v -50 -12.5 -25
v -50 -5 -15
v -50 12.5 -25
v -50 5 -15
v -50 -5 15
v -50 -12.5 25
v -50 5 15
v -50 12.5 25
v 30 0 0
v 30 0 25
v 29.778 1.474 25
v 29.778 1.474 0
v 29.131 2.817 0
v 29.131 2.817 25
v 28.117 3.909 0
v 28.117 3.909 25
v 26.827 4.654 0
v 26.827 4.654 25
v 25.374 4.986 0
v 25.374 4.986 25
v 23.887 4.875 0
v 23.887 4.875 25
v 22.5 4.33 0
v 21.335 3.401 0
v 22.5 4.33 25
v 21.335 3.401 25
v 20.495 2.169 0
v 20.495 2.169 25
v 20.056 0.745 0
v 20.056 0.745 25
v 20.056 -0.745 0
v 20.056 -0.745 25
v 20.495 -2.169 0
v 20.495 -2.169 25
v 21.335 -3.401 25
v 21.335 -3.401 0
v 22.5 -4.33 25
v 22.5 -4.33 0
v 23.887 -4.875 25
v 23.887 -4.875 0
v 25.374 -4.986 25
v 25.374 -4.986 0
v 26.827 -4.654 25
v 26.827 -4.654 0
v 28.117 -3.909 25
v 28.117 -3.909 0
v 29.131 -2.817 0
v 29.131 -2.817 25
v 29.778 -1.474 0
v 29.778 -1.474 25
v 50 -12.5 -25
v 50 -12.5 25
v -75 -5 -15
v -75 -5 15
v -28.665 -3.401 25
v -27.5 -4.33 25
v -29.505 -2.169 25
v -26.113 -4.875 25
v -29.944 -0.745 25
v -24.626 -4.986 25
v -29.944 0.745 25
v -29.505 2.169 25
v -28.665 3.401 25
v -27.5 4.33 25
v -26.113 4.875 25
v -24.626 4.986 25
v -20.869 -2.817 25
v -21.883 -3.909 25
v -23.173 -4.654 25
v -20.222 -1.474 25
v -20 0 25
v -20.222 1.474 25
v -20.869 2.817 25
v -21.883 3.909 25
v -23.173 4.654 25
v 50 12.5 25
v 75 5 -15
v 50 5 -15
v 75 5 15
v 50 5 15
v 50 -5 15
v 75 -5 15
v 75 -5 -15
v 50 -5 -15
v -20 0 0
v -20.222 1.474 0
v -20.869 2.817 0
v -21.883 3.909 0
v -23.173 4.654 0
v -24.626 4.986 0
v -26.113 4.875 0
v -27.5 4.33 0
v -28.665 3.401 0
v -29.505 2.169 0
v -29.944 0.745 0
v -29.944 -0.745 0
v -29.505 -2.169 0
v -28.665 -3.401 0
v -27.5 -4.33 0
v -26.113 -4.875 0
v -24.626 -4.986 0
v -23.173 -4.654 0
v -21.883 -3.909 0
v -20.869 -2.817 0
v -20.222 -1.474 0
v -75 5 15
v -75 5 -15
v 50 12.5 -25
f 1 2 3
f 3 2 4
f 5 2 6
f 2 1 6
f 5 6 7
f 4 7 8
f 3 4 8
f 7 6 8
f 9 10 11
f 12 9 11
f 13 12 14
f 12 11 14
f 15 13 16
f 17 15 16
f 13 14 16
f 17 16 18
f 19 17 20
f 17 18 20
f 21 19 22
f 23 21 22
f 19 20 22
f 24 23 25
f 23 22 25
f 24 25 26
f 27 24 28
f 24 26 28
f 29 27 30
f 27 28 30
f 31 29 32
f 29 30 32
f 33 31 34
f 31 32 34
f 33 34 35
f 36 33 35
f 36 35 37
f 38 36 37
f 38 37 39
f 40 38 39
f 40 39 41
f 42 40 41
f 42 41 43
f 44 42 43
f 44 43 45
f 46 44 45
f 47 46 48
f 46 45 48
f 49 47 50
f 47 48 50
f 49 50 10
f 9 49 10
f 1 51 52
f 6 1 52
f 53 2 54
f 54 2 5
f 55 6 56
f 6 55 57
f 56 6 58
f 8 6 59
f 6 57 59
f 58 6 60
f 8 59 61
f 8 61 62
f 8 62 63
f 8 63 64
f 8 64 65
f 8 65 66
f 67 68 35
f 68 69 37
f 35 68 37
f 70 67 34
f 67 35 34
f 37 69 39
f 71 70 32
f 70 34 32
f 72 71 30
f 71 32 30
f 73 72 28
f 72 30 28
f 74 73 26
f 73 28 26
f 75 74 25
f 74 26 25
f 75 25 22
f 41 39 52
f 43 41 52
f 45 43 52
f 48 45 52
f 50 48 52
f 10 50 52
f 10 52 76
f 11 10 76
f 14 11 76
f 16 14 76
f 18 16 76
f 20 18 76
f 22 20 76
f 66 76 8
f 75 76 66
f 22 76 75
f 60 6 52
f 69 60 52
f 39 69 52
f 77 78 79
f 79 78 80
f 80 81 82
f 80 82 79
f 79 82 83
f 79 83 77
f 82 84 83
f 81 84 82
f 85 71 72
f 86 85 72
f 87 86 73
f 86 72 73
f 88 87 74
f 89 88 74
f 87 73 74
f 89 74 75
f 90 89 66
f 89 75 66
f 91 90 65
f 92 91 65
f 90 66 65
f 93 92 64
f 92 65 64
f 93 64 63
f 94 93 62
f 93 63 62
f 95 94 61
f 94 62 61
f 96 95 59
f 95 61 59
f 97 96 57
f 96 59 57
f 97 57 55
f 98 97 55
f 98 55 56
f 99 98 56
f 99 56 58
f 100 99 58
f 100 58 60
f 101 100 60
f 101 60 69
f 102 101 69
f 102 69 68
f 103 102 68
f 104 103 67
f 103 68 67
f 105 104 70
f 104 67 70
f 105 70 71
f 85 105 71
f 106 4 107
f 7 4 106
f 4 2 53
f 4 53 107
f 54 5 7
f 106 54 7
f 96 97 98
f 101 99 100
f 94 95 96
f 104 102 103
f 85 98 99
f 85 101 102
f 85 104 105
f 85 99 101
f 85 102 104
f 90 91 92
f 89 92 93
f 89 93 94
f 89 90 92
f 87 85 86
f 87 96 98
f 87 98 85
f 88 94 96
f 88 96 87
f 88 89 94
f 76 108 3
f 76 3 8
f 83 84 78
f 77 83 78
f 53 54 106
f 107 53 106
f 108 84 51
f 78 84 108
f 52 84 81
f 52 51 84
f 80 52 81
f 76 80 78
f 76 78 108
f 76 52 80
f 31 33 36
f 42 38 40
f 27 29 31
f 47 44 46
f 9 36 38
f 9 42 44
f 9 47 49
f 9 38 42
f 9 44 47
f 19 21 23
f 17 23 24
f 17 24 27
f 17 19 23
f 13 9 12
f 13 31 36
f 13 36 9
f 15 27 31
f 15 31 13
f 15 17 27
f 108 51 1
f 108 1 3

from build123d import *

# Parameters (mm, degrees)
F0_W     = 25
F0_H     = 50
F1_DEPTH = 50
F2_W     = 10
F2_H     = 30
F3_DEPTH = 25
F5_R     = 5
F6_DEPTH = 25


with BuildPart() as f1:
    # F0 (on Right) → F1 (new body, symmetric)
    with BuildSketch(Plane.YZ):
        Rectangle(F0_W, F0_H)
    extrude(amount=F1_DEPTH, both=True)

    # F2 (on face) → F3 (join)
    with BuildSketch(Plane.YZ.offset(50)):
        Rectangle(F2_W, F2_H)
    extrude(amount=F3_DEPTH)

    # F4: F1 across plane


with BuildPart() as f1_1:
    add(f1.part)
    add(f1.part.mirror(Plane.YZ))

    # F5 (on face) → F6 (cut)
    with BuildSketch(Plane.XY.offset(25)):
        with Locations((-25, 0)):
            Circle(F5_R)
        with Locations((25, 0)):
            Circle(F5_R)
    extrude(amount=-F6_DEPTH, mode=Mode.SUBTRACT)


solid = f1_1.part
